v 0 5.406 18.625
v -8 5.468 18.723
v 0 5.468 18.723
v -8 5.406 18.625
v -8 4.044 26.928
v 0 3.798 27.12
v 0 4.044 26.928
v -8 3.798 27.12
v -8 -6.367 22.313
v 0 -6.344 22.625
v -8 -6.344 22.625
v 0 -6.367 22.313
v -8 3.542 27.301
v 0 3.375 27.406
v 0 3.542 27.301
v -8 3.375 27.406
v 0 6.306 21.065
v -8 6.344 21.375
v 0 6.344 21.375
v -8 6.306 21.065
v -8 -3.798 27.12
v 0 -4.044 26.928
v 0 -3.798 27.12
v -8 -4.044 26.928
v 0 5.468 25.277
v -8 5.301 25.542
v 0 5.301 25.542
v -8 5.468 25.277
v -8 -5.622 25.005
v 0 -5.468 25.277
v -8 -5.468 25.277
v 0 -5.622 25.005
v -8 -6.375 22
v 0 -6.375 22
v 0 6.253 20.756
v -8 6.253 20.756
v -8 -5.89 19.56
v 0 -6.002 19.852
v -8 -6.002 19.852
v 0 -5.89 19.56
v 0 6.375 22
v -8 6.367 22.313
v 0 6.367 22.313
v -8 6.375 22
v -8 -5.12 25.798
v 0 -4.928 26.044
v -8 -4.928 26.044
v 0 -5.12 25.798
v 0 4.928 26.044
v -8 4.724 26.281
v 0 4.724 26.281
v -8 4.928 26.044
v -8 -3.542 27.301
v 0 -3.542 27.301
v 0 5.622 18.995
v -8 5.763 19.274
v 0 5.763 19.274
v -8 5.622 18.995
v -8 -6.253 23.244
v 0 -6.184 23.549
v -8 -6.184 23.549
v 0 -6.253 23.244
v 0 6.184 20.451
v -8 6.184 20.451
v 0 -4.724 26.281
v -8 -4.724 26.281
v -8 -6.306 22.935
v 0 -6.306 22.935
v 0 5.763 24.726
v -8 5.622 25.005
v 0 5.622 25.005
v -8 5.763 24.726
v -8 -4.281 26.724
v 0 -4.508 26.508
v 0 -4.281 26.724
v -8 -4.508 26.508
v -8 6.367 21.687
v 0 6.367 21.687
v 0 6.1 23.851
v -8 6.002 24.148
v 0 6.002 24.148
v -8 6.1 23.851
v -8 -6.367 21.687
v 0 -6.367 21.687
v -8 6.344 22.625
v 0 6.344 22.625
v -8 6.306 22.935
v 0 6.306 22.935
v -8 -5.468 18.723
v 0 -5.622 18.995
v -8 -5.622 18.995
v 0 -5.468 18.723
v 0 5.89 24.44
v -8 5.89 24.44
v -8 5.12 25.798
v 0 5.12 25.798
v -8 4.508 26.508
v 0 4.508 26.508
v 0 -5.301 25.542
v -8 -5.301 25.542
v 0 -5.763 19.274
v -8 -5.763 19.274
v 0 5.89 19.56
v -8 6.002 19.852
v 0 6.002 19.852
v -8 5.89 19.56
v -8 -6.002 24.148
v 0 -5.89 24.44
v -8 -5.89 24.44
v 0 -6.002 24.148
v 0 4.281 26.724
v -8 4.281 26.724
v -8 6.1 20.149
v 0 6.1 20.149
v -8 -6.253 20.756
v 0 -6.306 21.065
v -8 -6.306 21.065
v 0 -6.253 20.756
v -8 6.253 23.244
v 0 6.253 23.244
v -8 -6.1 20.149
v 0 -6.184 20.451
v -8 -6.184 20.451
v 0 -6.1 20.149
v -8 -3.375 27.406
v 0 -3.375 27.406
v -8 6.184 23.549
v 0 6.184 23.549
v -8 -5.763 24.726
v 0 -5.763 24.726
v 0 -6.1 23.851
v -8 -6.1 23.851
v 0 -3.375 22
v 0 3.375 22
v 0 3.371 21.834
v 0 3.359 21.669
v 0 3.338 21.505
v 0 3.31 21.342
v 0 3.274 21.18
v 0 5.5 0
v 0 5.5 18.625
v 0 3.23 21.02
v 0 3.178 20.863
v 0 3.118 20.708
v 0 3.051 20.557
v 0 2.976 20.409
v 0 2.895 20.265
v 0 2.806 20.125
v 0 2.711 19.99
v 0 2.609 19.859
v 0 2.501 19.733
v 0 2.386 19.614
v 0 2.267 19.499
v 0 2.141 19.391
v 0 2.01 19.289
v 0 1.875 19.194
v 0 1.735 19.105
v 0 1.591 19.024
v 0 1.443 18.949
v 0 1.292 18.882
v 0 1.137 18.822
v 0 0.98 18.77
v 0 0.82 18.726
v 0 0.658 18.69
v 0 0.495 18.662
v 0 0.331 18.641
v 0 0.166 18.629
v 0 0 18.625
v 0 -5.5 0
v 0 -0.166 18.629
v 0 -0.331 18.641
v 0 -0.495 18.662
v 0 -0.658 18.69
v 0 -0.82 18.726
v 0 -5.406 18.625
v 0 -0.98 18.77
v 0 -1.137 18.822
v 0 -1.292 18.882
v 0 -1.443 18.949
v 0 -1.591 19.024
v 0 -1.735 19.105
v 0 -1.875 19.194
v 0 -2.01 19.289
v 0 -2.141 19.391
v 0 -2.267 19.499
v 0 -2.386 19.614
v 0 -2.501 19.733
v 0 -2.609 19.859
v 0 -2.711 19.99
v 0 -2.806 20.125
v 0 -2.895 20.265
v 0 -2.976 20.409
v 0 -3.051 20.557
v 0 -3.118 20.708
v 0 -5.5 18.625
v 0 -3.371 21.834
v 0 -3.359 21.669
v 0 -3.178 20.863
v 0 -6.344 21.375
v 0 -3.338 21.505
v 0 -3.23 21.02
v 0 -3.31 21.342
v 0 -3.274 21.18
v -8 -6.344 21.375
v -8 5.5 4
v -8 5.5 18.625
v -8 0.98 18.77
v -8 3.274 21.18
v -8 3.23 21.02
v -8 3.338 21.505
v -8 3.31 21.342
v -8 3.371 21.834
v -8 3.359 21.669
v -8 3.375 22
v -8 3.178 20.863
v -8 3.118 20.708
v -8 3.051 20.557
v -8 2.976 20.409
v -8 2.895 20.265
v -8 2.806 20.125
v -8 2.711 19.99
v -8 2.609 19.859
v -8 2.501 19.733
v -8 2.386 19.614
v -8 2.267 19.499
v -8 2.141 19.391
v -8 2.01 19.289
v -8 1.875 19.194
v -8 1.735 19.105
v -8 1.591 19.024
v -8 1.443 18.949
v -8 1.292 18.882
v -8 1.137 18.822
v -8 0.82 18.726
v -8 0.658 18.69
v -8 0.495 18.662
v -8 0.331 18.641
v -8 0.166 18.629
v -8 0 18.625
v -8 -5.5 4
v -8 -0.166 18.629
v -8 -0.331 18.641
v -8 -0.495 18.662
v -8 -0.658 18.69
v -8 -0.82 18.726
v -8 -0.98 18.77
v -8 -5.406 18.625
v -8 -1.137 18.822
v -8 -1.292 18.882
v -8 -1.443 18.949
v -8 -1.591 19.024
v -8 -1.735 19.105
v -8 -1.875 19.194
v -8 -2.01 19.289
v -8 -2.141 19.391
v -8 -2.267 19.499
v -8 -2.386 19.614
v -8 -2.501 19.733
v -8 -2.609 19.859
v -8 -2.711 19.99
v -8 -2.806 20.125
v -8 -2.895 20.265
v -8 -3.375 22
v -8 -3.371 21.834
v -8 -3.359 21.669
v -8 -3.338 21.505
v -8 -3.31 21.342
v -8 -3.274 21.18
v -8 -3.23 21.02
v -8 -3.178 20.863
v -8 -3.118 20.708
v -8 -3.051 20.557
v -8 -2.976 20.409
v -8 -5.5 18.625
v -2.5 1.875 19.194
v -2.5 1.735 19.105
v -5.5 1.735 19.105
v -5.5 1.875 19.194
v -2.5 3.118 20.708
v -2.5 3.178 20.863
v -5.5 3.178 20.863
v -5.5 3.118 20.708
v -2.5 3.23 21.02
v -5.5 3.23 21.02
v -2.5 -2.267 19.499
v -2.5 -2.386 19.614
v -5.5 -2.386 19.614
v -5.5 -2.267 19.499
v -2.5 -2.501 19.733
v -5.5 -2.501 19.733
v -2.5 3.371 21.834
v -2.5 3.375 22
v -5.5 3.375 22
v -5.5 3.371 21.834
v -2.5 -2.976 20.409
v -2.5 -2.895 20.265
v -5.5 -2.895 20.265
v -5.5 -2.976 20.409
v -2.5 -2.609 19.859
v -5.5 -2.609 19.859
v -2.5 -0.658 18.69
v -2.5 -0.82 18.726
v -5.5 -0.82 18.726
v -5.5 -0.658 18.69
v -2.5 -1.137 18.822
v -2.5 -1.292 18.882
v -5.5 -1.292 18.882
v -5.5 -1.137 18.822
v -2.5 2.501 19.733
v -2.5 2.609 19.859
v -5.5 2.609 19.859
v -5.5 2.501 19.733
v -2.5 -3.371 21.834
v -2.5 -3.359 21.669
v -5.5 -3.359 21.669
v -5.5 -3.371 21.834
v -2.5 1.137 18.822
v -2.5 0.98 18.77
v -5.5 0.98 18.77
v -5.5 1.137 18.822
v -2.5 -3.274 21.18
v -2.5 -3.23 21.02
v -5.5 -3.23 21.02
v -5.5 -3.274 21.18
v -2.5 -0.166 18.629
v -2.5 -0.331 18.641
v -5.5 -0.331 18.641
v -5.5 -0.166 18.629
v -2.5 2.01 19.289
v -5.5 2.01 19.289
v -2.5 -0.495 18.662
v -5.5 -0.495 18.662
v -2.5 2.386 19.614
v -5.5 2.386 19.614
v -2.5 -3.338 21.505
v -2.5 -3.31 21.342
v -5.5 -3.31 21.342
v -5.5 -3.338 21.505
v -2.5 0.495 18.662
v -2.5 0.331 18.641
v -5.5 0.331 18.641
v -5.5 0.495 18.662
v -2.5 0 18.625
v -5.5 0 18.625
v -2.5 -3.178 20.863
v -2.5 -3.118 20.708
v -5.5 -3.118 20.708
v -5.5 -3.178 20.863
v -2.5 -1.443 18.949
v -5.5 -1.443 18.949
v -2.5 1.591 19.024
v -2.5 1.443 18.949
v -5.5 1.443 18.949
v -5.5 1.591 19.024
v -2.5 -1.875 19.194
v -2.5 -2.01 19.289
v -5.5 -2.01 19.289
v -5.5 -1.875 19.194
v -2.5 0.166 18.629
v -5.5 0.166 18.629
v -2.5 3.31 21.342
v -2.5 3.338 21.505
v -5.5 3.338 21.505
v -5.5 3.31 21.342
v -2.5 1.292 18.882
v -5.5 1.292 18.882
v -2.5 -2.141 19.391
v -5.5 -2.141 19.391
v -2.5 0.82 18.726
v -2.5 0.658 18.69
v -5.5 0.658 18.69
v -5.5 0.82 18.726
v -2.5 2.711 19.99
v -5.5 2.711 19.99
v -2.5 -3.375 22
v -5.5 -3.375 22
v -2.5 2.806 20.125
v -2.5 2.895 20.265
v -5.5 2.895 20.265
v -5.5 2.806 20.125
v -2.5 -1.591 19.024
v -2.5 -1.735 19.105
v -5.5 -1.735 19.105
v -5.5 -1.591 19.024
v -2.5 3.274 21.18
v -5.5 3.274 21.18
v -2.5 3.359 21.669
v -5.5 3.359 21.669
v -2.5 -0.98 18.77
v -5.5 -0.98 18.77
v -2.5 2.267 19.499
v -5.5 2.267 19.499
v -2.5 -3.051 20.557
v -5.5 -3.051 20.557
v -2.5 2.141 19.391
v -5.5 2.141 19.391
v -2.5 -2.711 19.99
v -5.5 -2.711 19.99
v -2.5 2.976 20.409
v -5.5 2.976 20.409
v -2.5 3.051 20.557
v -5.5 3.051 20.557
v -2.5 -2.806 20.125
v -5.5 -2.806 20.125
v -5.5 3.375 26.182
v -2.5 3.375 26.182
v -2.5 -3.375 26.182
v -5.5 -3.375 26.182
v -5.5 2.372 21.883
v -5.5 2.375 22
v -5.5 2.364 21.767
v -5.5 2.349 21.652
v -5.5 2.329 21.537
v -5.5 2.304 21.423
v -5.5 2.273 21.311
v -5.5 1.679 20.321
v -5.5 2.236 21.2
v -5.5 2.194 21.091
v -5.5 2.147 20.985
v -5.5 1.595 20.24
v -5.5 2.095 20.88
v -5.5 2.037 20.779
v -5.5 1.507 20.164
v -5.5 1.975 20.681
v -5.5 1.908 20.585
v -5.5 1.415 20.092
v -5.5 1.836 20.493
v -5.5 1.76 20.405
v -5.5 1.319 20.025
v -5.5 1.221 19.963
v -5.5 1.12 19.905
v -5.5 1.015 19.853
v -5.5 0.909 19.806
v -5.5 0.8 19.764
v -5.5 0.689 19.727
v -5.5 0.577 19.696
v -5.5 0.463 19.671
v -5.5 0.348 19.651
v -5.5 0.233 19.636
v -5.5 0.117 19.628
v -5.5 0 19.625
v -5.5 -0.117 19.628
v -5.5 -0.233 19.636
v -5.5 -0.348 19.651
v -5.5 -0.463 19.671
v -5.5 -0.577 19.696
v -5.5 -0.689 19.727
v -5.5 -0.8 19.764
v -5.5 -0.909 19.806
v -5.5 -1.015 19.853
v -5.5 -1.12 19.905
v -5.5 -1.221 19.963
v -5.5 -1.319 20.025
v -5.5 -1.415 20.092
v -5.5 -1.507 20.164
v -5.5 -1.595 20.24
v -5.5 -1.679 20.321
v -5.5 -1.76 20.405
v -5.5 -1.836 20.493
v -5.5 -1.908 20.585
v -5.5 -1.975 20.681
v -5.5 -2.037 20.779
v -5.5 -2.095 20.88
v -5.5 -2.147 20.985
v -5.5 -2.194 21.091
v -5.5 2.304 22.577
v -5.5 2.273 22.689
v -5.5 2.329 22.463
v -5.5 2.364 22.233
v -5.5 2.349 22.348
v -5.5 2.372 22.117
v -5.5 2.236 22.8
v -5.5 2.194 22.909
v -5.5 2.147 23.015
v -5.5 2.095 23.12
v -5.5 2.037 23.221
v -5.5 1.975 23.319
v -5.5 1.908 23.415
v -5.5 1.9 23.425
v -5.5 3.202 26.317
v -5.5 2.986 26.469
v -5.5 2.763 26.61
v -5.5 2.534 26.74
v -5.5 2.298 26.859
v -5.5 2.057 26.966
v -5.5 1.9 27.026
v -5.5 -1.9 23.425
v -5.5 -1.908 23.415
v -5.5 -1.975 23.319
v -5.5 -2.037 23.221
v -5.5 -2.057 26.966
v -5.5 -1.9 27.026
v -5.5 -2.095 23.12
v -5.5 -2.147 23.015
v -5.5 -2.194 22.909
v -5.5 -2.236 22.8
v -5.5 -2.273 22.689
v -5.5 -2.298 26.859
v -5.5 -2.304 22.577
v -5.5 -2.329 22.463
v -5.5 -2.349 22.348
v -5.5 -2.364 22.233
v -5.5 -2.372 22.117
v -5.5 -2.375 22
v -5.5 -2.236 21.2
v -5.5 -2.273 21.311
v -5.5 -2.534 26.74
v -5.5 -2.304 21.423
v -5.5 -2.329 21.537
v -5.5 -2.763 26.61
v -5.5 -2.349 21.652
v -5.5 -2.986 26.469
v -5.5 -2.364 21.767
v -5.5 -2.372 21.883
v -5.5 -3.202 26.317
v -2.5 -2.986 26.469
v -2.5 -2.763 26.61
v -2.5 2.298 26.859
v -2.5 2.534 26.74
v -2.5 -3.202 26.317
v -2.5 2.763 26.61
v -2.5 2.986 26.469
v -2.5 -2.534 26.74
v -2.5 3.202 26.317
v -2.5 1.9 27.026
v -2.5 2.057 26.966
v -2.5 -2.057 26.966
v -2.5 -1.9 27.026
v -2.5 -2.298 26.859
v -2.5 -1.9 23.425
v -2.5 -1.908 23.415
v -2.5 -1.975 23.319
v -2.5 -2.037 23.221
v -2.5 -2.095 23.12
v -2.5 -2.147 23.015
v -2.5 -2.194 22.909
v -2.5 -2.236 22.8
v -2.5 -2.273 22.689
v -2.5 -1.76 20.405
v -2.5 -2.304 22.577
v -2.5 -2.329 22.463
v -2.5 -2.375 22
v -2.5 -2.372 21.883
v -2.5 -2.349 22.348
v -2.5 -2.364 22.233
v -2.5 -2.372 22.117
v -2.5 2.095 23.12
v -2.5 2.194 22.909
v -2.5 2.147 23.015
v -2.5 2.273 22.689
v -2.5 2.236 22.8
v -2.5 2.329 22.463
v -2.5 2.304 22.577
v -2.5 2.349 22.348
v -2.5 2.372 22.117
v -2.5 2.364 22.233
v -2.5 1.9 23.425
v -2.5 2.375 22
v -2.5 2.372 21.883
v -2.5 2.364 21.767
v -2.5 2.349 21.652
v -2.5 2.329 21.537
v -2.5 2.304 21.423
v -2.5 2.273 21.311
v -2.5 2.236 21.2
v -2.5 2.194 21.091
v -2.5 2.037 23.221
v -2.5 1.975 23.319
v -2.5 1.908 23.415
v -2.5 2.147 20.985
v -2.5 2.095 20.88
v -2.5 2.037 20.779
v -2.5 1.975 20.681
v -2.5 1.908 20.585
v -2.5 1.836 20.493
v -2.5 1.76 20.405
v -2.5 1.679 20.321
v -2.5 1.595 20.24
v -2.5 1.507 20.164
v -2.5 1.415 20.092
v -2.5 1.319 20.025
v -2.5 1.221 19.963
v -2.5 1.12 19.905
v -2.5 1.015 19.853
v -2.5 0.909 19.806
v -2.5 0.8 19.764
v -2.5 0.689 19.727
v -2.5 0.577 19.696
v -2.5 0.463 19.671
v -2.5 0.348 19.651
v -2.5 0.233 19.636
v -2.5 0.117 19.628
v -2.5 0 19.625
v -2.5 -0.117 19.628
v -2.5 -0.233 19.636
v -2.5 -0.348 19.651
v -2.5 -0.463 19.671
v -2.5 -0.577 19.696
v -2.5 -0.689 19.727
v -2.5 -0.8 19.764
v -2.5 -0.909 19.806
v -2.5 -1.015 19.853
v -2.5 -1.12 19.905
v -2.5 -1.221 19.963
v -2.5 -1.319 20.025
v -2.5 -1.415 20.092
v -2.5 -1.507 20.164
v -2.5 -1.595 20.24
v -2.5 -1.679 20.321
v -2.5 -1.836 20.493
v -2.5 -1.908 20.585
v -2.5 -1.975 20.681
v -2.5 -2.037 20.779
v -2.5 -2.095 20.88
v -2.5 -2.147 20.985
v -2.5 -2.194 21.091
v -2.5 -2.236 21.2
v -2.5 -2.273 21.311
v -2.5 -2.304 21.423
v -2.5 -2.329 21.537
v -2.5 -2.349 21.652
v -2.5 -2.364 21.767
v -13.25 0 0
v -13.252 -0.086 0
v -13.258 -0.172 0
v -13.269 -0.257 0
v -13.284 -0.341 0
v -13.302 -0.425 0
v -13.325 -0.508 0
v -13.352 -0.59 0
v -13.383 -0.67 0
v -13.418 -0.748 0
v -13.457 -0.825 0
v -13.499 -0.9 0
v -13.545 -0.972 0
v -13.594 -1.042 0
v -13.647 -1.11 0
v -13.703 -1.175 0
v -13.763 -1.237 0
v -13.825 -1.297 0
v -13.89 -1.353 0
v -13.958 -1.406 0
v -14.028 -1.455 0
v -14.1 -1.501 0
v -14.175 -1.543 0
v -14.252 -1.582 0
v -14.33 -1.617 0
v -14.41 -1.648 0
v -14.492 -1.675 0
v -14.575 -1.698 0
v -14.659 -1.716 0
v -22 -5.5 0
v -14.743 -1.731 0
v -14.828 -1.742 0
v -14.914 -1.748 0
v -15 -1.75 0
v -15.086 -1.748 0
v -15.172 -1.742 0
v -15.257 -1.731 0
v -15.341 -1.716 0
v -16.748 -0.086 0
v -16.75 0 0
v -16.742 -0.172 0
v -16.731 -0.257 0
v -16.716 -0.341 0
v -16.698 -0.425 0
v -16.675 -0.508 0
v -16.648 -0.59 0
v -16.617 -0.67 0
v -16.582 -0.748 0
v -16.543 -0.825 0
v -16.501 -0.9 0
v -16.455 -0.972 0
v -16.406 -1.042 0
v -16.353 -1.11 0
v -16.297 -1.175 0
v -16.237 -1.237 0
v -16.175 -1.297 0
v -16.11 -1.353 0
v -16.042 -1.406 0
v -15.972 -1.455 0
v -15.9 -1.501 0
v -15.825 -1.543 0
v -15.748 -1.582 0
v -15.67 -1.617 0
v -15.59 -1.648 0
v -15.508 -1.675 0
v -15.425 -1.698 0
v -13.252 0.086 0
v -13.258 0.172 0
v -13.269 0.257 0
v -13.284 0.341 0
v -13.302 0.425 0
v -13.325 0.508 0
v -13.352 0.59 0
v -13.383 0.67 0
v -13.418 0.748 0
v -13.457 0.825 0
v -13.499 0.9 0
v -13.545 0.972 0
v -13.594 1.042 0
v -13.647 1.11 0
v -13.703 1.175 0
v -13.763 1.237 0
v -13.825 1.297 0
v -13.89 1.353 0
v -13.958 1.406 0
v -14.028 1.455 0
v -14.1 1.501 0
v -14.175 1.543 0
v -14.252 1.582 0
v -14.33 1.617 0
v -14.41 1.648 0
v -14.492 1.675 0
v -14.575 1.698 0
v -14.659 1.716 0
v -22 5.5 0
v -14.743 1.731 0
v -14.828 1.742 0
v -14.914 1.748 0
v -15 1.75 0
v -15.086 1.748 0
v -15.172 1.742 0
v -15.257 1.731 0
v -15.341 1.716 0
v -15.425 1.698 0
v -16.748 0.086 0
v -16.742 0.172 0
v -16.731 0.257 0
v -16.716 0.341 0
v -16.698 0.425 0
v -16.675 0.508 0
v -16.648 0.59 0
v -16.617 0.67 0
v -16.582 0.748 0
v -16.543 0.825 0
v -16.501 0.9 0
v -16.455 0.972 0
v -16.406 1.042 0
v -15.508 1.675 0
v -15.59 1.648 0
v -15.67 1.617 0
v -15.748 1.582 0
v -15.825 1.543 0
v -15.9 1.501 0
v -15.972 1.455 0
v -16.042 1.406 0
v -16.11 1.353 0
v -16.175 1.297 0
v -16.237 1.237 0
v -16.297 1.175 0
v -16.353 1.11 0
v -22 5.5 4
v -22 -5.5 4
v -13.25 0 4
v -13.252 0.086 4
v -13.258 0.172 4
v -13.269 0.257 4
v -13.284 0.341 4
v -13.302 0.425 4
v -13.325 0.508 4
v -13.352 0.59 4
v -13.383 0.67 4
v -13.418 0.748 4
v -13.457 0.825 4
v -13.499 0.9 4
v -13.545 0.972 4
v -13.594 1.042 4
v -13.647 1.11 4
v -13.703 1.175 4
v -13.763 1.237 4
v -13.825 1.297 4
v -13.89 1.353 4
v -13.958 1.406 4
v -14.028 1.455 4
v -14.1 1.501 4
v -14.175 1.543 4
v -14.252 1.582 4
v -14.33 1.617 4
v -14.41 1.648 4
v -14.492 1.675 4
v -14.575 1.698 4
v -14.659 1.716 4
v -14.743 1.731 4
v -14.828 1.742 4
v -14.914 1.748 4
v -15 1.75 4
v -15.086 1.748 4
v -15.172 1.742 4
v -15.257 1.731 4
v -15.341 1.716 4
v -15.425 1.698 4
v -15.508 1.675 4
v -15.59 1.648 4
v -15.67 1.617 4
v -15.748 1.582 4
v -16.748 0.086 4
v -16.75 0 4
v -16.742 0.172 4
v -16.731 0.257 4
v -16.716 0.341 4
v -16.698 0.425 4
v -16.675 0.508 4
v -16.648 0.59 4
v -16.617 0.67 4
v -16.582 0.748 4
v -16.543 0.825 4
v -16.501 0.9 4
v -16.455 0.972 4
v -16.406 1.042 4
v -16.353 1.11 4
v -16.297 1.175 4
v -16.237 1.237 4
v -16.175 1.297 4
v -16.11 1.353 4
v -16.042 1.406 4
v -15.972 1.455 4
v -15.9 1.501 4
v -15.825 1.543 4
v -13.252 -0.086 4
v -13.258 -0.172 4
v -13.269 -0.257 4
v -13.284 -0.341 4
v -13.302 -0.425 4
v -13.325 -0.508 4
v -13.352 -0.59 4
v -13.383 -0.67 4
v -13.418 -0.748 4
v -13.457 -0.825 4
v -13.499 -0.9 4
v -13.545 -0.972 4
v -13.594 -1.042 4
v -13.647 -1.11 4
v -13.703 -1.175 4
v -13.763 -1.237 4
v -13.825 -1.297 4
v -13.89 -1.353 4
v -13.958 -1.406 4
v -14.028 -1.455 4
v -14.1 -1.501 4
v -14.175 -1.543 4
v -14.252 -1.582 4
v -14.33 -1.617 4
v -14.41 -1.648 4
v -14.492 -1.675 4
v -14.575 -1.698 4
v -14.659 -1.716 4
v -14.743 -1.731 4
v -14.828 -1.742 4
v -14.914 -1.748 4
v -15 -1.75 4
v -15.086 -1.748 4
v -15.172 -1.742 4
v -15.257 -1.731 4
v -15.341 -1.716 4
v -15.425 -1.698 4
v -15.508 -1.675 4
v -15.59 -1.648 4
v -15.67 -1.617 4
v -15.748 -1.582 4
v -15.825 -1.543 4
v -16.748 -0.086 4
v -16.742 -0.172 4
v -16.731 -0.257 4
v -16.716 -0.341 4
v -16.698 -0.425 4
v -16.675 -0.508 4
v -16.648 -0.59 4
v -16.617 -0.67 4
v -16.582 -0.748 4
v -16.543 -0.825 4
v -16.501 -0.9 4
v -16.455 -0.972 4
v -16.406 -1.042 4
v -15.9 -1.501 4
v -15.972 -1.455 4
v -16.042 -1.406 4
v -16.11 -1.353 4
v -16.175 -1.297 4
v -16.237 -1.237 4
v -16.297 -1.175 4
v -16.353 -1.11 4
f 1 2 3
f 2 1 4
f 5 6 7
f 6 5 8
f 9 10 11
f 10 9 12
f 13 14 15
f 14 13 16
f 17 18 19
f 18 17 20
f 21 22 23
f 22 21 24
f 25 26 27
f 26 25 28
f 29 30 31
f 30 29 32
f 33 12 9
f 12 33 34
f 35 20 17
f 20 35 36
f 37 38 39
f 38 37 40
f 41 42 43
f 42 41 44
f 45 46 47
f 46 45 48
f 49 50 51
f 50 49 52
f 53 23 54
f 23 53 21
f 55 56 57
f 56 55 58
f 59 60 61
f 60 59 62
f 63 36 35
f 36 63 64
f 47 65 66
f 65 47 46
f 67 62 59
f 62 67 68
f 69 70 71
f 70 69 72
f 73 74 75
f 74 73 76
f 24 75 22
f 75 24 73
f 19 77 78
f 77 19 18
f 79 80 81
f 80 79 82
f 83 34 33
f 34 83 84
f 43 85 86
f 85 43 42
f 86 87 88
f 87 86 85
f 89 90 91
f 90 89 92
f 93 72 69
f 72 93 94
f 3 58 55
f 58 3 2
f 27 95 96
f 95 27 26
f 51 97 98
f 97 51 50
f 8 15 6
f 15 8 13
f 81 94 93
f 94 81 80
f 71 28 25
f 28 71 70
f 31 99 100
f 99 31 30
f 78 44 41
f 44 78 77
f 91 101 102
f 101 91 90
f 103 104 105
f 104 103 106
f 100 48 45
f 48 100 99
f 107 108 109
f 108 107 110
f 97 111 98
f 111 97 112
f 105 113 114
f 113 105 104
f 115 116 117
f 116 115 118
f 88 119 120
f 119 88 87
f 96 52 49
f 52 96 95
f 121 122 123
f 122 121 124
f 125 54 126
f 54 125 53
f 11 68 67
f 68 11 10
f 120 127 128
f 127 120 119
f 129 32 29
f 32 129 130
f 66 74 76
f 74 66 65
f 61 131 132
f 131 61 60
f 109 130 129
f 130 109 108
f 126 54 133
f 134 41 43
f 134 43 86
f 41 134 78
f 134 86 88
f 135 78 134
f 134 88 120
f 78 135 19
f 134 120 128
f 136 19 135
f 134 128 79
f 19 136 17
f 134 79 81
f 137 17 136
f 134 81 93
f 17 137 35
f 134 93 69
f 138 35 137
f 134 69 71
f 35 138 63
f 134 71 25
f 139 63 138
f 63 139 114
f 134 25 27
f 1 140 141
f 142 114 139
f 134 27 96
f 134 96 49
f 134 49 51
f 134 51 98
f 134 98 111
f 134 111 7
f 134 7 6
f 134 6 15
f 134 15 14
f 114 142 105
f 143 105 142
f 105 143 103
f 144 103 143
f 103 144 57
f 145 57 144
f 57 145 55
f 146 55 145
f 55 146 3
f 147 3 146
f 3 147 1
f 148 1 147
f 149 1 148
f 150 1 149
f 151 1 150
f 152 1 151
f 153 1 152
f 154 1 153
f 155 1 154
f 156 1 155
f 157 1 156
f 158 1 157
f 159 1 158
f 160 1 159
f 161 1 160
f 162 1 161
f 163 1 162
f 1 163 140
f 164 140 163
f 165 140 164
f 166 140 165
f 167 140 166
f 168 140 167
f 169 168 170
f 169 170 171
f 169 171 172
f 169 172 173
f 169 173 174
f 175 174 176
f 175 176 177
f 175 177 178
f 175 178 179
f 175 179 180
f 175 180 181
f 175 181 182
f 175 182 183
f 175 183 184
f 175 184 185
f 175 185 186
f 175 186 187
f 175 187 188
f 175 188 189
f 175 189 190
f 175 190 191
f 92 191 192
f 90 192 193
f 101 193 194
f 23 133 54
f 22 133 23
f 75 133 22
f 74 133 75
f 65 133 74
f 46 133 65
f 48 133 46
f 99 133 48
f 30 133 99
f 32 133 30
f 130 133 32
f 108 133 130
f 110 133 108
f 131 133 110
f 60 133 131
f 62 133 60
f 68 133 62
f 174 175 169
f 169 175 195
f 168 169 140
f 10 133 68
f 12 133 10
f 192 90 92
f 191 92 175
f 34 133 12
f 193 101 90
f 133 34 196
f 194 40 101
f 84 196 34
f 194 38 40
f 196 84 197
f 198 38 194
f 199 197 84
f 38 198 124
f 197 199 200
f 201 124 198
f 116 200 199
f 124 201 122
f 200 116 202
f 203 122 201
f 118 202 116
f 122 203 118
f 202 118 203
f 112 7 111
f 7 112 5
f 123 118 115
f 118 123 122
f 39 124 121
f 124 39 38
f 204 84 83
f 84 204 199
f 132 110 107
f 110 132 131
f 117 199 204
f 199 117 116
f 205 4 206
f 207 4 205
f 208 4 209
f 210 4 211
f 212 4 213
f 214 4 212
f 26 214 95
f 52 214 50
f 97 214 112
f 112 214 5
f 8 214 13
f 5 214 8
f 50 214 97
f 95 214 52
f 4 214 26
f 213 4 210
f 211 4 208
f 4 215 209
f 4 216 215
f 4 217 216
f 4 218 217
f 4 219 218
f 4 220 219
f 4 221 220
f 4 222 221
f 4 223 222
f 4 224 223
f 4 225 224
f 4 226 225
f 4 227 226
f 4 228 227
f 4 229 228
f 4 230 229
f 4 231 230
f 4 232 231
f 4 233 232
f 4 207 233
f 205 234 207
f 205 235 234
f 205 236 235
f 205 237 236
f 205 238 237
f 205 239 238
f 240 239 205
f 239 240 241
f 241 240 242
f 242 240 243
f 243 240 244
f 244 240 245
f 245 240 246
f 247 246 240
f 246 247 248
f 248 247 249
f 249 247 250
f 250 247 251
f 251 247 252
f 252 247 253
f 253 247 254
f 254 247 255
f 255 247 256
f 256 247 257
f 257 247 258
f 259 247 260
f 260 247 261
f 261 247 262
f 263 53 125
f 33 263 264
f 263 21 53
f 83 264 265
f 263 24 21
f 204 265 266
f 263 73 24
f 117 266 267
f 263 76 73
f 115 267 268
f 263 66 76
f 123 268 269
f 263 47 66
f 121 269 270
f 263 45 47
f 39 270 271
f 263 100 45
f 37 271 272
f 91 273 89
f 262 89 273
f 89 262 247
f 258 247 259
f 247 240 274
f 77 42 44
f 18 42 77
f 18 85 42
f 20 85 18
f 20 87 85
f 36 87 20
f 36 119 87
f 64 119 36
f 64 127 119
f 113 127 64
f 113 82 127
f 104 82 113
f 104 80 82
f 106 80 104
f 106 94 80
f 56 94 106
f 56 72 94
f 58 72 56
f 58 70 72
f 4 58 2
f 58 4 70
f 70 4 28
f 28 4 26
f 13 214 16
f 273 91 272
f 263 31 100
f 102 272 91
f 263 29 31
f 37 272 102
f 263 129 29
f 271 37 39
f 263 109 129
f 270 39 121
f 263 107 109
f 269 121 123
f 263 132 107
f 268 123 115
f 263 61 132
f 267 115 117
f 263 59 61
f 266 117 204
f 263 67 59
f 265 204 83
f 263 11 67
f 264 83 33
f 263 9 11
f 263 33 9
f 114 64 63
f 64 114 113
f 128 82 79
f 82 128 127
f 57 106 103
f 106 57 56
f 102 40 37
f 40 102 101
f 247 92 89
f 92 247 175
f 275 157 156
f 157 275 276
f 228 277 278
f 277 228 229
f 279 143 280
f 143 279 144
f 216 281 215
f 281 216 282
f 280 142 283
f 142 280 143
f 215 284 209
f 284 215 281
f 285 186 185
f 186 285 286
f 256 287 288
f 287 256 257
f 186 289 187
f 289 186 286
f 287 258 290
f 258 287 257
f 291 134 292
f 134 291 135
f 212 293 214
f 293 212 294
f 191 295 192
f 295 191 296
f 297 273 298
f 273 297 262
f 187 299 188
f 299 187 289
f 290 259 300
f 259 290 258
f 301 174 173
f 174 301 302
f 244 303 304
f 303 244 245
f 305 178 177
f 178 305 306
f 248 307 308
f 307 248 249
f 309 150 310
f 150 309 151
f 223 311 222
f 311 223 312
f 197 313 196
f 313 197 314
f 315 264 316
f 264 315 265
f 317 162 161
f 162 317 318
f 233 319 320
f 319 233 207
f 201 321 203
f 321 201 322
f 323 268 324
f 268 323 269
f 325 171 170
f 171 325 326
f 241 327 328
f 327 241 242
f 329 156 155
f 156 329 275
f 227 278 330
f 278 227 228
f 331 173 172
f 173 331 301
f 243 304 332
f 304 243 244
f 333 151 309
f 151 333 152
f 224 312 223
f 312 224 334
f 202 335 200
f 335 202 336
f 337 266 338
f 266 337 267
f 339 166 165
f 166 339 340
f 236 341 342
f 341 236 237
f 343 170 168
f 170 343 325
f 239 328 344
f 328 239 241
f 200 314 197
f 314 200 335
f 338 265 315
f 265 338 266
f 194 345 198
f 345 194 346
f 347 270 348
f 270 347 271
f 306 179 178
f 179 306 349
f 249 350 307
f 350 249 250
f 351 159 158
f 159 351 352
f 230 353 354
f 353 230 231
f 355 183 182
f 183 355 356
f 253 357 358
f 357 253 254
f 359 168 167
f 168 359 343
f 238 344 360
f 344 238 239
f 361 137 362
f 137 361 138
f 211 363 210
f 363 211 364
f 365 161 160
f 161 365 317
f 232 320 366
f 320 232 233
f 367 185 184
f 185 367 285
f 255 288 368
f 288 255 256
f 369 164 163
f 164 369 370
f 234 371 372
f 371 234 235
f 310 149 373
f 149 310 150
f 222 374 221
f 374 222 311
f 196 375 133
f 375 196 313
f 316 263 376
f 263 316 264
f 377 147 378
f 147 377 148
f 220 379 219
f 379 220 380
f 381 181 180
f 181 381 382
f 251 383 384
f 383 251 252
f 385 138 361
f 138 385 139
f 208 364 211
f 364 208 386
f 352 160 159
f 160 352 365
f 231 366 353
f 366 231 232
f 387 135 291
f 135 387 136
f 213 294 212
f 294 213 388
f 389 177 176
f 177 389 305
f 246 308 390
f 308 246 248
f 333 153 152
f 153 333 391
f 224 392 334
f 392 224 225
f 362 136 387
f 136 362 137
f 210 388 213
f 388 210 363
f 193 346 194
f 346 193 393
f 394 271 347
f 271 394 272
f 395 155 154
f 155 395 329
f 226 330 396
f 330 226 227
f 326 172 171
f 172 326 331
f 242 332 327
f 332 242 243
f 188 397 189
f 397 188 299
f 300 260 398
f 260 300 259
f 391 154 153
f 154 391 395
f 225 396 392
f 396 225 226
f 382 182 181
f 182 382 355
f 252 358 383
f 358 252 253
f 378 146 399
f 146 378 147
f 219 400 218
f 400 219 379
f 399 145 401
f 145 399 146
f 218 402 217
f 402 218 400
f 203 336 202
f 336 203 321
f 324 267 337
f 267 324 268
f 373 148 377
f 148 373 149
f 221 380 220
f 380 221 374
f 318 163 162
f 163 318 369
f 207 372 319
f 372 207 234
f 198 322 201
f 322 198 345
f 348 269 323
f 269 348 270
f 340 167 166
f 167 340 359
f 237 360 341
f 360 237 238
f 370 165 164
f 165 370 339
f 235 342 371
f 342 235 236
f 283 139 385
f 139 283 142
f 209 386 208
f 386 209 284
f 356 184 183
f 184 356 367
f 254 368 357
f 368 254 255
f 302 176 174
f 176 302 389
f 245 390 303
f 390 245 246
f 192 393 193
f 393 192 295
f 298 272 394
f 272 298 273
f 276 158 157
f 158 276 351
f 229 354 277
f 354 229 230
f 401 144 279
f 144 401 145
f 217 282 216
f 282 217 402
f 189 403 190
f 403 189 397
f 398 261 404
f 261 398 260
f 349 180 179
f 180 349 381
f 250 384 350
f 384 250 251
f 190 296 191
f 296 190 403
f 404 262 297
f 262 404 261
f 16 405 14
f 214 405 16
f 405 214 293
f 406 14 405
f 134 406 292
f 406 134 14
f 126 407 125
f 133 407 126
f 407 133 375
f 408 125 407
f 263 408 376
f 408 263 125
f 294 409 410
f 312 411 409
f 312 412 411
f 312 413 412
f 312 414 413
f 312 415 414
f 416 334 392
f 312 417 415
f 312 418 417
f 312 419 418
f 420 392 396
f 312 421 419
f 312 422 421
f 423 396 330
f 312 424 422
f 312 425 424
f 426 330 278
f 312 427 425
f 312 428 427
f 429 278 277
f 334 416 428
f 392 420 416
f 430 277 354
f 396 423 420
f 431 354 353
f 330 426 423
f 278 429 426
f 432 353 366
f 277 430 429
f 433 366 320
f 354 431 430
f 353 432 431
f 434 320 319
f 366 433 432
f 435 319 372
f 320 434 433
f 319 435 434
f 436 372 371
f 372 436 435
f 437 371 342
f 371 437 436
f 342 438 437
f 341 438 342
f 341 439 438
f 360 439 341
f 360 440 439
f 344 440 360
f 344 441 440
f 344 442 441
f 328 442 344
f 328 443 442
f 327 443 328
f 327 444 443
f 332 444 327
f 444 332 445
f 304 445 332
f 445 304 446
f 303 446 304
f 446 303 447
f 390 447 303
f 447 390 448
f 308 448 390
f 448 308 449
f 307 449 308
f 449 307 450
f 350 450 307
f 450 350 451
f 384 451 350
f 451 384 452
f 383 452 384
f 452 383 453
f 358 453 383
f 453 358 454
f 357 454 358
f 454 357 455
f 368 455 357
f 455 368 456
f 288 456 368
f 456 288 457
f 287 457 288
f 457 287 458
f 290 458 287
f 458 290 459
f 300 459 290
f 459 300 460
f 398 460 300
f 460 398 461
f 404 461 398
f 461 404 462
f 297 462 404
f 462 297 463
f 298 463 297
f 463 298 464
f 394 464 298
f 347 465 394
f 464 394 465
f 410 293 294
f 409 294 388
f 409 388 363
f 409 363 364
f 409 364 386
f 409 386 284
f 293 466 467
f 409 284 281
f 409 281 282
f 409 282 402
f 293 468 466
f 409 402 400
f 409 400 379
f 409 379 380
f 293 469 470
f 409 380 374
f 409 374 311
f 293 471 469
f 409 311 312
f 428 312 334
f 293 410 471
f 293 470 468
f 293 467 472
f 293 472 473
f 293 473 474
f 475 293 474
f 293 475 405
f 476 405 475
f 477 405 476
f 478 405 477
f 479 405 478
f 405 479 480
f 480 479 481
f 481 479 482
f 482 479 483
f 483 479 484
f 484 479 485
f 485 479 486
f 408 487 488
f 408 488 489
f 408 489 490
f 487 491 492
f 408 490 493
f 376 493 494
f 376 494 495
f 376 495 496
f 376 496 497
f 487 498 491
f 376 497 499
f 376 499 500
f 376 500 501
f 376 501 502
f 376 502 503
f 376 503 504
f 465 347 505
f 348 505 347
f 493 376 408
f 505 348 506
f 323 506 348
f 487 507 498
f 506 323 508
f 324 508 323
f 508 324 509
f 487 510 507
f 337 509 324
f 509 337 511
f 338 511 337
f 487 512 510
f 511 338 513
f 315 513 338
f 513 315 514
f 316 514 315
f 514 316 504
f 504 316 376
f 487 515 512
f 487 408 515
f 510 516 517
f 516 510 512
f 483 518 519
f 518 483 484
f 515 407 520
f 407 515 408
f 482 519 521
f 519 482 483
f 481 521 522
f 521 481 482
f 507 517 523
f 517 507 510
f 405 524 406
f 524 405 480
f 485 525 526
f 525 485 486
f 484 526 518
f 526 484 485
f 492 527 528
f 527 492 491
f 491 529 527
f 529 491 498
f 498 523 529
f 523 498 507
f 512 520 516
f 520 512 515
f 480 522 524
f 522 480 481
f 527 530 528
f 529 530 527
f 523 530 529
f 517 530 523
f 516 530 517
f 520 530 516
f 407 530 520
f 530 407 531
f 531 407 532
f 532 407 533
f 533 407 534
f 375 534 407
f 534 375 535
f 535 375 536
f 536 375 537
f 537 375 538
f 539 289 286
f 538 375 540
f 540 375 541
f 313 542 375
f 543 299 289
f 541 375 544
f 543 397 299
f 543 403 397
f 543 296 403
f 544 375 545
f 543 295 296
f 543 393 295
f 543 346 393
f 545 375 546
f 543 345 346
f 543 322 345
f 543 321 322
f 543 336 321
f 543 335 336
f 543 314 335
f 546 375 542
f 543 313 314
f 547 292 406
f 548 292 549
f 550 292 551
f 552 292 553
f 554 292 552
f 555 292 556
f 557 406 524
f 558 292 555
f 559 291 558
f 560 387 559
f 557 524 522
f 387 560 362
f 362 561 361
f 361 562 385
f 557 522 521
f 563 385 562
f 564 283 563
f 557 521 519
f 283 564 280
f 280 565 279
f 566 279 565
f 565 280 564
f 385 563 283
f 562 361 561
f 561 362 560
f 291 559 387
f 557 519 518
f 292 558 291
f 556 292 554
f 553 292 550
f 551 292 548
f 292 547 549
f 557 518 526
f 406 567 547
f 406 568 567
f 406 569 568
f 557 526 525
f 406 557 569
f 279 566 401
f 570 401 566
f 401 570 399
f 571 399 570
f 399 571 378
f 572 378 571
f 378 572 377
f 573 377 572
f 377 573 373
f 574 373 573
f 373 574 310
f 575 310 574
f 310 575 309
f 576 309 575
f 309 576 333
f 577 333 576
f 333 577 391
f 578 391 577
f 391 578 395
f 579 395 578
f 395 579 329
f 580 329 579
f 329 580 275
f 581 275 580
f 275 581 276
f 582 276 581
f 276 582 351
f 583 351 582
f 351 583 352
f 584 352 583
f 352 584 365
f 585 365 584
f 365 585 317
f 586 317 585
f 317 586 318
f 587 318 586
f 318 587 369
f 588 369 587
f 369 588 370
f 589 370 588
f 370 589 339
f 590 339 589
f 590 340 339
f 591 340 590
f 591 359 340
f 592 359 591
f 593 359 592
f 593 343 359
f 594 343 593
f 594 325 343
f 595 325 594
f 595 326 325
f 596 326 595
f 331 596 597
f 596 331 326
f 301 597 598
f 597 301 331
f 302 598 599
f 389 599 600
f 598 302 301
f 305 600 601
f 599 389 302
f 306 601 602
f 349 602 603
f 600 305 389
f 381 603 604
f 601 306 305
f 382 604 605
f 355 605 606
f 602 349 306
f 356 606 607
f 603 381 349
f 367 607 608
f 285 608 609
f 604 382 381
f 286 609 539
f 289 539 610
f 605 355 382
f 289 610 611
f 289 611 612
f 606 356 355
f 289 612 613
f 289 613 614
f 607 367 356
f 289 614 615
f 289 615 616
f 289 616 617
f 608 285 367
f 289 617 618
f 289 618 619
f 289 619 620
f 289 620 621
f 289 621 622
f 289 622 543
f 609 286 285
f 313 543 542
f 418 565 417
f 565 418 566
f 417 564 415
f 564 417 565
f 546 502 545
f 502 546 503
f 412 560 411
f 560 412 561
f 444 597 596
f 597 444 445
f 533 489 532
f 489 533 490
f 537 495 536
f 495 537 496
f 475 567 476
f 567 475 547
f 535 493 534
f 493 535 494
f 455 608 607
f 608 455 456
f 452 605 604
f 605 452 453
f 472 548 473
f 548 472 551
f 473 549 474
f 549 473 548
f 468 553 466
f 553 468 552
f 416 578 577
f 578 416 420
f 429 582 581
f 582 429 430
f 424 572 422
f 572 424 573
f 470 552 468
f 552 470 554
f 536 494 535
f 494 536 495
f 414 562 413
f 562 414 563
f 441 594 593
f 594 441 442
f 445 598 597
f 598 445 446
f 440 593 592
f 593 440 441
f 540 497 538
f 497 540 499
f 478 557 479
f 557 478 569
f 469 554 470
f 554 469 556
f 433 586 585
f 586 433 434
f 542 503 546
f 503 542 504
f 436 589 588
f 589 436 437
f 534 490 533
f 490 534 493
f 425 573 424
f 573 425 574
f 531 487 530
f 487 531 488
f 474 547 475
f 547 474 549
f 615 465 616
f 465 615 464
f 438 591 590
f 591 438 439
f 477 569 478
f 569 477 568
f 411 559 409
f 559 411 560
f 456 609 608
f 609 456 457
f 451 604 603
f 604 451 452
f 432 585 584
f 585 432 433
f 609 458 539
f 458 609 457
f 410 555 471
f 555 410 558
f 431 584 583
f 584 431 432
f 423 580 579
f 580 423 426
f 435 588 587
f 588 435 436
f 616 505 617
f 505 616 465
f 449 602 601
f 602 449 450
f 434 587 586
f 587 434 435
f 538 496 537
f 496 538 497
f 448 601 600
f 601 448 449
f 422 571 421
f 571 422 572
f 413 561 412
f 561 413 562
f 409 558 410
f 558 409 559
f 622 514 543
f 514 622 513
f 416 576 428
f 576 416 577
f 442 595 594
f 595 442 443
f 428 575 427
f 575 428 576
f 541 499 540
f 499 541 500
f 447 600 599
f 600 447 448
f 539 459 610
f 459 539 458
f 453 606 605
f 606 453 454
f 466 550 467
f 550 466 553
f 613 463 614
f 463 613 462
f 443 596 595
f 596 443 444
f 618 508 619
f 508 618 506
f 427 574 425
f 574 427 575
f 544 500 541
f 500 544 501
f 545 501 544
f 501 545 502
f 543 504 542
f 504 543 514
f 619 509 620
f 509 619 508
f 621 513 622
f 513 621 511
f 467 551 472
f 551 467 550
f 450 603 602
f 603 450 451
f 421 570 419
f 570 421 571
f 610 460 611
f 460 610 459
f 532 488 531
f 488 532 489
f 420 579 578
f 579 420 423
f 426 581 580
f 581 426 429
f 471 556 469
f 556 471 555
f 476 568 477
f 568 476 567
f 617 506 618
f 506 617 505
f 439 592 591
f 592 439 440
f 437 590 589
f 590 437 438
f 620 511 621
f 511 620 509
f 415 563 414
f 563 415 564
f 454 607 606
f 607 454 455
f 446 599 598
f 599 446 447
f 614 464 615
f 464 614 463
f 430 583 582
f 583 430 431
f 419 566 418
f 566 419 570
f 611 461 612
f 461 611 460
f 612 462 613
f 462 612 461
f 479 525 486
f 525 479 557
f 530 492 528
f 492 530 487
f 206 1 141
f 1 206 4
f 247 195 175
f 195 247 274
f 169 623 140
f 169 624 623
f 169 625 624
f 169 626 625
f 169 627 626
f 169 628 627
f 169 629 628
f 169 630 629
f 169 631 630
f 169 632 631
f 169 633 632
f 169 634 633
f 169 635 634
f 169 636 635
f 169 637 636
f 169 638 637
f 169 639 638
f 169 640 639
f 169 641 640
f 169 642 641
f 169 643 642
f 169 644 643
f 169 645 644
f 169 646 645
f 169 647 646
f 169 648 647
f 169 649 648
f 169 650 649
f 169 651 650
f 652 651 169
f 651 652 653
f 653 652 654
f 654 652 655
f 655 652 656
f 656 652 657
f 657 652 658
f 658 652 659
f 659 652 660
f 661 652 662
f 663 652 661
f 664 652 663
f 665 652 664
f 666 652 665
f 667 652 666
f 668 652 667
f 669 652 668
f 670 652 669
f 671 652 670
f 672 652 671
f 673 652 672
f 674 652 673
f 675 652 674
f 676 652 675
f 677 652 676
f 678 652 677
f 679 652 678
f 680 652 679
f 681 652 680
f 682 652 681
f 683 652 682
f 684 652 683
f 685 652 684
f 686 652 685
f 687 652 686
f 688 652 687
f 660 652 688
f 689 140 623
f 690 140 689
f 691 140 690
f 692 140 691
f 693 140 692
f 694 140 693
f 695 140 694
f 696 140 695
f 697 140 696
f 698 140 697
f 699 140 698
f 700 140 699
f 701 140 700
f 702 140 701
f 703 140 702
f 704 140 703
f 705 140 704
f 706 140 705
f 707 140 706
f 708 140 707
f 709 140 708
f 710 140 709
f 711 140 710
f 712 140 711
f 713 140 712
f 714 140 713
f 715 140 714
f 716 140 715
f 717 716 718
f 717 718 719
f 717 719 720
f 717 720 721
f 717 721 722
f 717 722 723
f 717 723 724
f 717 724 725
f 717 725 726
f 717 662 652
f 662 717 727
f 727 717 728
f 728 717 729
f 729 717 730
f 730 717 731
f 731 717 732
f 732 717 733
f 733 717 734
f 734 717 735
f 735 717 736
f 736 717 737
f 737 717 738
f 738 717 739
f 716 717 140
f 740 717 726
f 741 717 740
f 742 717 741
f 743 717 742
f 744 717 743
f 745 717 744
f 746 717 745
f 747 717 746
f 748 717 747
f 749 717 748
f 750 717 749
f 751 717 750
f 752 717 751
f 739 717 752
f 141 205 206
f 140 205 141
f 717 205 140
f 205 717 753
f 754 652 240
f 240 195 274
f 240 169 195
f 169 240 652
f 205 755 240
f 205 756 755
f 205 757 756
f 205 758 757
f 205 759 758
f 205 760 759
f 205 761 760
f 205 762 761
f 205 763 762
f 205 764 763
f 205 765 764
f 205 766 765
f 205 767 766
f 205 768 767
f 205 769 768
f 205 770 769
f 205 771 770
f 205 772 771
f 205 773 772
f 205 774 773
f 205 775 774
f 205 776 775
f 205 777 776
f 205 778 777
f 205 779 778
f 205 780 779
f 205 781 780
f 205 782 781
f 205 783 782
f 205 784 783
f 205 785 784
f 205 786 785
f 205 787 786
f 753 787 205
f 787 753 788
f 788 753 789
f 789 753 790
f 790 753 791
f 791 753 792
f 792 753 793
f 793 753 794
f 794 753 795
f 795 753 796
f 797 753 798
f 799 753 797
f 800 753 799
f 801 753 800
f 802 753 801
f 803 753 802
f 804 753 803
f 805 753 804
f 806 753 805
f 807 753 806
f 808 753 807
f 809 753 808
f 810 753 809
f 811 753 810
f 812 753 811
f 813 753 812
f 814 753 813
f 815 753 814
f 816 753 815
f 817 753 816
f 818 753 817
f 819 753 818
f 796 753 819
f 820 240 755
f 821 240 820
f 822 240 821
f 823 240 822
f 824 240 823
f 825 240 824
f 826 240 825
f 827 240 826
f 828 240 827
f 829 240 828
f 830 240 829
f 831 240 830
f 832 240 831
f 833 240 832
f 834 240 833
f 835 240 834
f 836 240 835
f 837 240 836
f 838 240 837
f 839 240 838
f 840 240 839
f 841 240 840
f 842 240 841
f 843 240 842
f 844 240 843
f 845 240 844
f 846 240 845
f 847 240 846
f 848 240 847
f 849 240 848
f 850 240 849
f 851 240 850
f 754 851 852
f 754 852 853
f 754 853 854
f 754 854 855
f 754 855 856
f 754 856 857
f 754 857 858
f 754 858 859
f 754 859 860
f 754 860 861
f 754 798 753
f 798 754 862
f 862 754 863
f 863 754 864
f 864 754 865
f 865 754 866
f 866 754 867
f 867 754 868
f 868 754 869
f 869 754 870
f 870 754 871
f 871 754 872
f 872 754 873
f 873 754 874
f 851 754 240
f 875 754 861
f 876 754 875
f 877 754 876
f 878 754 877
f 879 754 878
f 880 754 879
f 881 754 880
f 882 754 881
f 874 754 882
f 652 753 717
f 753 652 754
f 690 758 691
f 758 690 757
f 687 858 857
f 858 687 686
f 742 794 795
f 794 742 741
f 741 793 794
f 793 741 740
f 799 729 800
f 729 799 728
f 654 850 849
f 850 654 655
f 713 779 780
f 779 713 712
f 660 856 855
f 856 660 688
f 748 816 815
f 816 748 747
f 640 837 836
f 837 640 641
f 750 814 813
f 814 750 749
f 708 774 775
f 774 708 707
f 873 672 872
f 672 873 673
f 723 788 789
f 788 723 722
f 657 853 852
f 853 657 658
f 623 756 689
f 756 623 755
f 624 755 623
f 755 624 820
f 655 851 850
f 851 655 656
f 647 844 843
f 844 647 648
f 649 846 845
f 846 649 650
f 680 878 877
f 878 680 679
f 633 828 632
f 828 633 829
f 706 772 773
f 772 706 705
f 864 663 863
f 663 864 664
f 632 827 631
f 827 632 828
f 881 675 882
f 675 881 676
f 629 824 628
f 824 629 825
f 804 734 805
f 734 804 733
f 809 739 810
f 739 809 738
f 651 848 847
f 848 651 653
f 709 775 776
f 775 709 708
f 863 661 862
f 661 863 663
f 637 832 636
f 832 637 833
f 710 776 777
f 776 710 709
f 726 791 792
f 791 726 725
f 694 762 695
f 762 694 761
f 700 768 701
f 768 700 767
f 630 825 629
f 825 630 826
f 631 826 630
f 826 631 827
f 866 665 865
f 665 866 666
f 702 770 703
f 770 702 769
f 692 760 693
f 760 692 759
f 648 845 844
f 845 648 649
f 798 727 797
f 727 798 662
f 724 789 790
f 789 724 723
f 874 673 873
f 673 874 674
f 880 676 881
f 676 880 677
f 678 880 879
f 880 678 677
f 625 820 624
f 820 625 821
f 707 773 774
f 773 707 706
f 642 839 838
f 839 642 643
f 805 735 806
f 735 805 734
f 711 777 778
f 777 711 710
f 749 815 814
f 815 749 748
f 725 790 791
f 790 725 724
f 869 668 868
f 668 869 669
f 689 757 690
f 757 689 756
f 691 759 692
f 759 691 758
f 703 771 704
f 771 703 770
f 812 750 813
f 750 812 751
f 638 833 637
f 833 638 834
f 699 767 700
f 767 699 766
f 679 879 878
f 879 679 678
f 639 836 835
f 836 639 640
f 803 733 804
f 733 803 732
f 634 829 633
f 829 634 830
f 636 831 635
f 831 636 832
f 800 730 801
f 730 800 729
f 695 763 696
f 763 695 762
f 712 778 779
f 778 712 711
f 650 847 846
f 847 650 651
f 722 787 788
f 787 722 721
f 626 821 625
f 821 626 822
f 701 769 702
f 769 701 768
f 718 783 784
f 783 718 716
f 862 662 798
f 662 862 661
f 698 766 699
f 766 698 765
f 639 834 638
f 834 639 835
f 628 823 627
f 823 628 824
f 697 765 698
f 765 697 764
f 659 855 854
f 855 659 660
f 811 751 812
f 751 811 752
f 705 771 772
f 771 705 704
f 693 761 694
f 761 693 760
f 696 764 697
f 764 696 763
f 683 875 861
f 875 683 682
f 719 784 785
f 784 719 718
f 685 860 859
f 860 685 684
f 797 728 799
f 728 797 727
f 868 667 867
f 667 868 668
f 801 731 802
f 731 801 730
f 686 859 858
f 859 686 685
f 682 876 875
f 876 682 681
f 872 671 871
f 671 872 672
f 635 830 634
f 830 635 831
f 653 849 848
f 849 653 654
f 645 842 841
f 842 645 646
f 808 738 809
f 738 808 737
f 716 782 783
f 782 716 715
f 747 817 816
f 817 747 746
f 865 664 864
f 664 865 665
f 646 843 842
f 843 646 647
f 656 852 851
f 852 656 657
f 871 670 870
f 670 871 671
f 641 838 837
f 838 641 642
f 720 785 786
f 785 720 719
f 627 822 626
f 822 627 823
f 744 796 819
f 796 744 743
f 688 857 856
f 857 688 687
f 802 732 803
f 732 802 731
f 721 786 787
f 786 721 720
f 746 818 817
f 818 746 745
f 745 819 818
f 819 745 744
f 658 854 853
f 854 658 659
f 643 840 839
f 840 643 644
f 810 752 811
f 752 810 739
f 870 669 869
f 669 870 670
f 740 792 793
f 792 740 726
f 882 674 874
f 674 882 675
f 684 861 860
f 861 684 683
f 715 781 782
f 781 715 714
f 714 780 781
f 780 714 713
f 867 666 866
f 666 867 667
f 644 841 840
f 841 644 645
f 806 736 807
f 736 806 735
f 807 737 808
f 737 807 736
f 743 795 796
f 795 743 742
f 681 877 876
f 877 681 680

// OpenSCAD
$fn=128;

wall = 3;
h = 8;

module clip(d, h = h, cutout_pct = 0.7) {
    difference() {
        cylinder(d = d + wall*2, h=h);
        cylinder(d=d, h=100);
        clip_hole = d*cutout_pct;
        translate([0, -clip_hole/2, 0]) cube([100, clip_hole, 100]);
    }
}

clip_d = 8;
tube_d = 6.75;
notch_d = 4.75;
notch_h = 3;
w = clip_d + wall;

rotate([0, -90, 0])
difference() {
    union() {
        translate([0, -w/2, 0]) cube([22 - tube_d/2, w, h]);
        translate([22, 0, 0]) clip(tube_d, cutout_pct = 1);
        translate([22, 0, h/2 - notch_h/2]) clip(notch_d, notch_h, cutout_pct = 0.8);
        translate([0, -w/2, h]) cube([4, w, h+wall*2]);
    }
    translate([-50, 0, h + h/2 + wall]) rotate([0, 90, 0]) cylinder(d = 3.5, h=100);
}
